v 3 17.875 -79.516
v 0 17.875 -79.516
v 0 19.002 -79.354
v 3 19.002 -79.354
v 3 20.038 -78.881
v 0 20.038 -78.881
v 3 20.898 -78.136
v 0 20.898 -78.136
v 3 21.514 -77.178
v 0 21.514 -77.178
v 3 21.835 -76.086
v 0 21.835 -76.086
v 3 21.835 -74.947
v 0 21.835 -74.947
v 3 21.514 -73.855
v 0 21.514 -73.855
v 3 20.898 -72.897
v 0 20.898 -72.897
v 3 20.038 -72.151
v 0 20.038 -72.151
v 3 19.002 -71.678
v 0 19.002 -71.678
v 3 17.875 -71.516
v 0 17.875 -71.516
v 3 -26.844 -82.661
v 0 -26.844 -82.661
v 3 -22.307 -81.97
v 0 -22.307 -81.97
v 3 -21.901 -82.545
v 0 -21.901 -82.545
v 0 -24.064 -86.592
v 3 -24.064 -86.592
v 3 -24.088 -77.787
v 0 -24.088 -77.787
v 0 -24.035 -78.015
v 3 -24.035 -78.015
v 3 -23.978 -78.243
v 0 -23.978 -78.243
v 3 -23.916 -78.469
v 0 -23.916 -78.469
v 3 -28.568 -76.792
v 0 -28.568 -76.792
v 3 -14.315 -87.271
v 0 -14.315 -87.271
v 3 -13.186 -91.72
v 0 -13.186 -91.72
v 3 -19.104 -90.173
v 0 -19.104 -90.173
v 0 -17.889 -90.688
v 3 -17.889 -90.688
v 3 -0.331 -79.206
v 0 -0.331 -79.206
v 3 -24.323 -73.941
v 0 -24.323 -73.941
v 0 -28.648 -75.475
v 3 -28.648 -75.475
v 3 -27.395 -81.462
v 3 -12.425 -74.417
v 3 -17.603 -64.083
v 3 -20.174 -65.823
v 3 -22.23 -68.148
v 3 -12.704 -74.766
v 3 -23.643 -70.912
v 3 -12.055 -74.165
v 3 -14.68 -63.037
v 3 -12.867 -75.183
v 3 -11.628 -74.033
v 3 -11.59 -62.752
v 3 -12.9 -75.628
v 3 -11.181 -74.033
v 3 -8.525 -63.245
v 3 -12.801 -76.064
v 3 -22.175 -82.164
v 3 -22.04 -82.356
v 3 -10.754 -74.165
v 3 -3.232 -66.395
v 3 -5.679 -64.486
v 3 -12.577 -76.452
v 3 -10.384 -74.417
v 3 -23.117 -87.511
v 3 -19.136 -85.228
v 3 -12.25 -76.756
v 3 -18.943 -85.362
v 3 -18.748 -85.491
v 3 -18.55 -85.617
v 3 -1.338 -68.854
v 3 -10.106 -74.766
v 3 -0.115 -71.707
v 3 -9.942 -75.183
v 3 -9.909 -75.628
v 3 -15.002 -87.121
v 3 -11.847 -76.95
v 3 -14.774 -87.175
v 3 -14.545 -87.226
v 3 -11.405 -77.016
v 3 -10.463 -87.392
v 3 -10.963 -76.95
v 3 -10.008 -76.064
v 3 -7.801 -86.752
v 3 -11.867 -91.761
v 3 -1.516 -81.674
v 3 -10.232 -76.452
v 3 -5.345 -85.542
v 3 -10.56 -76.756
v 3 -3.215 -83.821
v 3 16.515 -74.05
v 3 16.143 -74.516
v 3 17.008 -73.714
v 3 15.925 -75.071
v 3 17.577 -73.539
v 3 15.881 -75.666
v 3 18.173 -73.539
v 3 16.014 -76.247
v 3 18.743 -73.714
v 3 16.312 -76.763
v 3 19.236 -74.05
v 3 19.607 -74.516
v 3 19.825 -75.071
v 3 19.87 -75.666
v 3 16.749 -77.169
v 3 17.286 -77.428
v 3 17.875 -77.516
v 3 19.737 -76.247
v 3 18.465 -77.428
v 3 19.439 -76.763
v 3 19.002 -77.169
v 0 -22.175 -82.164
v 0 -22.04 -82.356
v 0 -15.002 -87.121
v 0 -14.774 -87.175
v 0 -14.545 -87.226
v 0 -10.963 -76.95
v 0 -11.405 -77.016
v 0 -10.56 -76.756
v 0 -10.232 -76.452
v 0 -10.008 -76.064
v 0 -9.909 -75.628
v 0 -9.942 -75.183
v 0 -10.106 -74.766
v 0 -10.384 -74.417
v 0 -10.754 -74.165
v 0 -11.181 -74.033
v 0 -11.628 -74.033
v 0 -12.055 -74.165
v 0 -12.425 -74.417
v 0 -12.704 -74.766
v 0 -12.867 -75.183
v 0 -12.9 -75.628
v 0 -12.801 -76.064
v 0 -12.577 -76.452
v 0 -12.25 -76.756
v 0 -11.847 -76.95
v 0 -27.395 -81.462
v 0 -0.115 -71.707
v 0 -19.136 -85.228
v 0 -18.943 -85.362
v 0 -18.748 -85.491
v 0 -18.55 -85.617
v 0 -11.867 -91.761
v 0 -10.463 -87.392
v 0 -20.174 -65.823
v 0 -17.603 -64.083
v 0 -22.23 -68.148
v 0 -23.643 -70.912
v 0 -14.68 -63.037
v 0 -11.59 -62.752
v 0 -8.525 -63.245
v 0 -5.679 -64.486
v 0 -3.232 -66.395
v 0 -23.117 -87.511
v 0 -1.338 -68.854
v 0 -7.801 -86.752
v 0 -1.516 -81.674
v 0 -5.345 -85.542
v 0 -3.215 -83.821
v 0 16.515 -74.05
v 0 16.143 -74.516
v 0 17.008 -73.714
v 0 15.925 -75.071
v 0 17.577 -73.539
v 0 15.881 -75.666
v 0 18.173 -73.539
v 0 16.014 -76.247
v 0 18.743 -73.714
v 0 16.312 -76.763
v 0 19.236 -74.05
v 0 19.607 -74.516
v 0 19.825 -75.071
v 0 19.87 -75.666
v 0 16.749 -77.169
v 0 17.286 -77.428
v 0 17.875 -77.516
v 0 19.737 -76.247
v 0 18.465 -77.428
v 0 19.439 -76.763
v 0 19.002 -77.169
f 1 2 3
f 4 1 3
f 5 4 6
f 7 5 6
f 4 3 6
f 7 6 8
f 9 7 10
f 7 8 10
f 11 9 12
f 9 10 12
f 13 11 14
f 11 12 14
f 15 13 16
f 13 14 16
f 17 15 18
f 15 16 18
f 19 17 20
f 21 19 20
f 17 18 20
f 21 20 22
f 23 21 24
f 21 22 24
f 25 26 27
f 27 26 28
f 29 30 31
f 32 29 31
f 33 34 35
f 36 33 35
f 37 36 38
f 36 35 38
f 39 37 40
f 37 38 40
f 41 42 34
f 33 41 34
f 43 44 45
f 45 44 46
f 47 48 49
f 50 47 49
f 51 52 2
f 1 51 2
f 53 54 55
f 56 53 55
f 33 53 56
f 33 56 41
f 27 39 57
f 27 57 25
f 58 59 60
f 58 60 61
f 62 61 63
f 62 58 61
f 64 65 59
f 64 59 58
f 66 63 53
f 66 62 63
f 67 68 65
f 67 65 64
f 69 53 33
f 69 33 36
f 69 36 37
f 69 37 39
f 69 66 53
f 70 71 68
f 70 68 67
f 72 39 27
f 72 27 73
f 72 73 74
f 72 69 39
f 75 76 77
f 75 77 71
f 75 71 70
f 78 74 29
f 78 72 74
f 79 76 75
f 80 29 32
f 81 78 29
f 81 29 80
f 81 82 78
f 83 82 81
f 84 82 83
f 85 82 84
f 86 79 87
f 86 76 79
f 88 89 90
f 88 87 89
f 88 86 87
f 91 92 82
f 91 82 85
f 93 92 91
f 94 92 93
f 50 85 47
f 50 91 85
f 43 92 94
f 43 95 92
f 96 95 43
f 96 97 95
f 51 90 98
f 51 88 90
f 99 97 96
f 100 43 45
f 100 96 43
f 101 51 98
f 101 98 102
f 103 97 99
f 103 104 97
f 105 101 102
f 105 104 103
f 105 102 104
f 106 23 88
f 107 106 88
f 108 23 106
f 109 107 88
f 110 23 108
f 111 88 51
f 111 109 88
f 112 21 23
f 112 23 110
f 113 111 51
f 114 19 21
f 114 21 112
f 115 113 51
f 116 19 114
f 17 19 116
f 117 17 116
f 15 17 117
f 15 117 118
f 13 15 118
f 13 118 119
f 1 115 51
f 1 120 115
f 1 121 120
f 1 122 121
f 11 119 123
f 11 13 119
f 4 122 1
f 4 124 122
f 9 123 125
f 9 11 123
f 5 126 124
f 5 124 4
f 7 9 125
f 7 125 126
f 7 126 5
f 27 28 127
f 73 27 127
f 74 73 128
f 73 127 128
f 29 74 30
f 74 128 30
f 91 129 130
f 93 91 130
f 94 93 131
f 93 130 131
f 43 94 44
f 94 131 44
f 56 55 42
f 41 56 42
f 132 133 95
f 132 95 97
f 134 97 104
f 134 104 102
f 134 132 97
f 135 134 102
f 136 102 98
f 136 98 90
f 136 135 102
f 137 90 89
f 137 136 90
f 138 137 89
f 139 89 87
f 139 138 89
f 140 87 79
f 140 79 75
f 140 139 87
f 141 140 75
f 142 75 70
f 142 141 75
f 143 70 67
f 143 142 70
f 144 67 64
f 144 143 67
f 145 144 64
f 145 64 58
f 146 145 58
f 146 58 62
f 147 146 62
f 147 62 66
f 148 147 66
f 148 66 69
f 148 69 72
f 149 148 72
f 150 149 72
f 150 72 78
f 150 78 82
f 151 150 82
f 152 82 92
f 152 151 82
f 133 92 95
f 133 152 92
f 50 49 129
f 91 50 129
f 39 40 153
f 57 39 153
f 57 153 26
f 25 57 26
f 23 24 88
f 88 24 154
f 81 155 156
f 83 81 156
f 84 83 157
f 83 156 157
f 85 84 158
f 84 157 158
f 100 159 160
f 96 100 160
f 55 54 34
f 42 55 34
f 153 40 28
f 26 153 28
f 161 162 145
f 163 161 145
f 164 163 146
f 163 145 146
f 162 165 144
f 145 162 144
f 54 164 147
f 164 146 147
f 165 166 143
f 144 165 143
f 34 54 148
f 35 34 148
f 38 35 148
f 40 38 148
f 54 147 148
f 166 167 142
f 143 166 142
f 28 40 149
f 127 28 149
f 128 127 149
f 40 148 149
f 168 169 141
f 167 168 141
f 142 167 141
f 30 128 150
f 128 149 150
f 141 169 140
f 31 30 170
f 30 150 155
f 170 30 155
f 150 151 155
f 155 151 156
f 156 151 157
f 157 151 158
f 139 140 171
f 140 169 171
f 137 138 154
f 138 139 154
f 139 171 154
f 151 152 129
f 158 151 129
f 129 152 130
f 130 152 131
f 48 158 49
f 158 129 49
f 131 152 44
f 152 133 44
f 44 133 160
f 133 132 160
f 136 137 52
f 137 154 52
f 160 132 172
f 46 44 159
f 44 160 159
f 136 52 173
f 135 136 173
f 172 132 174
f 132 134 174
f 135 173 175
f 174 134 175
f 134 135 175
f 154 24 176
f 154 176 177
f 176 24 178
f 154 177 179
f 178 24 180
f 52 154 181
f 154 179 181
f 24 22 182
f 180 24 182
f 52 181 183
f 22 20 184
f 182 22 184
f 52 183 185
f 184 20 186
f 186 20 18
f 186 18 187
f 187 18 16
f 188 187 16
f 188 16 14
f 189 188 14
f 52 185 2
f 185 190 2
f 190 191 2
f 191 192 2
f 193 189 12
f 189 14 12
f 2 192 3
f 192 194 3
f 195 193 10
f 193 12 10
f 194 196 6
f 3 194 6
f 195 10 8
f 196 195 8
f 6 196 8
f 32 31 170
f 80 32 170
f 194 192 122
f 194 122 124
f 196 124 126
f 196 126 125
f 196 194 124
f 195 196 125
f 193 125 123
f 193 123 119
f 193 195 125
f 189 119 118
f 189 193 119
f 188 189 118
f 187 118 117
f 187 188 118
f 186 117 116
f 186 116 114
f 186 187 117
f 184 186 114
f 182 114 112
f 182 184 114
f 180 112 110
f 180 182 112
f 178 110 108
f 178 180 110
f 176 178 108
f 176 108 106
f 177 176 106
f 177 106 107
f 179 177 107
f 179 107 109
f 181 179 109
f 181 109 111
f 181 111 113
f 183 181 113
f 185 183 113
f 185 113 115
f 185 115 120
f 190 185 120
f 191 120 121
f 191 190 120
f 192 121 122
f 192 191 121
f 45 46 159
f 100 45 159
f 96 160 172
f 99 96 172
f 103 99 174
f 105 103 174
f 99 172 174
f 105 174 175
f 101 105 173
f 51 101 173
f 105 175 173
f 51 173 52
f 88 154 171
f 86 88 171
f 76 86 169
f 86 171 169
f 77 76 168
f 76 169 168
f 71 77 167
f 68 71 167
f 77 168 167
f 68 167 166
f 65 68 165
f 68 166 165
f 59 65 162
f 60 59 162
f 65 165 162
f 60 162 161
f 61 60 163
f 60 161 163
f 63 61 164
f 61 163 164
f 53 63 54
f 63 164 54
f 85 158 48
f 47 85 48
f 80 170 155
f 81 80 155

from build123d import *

# Parameters (mm, degrees)
SKETCH_1_R      = 2
SKETCH_1_R_2    = 1.5
EXTRUDE_2_DEPTH = 3


with BuildPart() as part:
    # ｽｹｯﾁ1 → ﾎﾞｽ - 押し出し2 (new body)
    with BuildSketch(Plane(origin=(0, 0, 0), x_dir=(0, 0, -1), z_dir=(1, 0, 0))):
        with BuildLine():
            ThreePointArc((79.516381724, 17.875328128), (75.516381724, 21.875328128), (71.516381724, 17.875328128))
            Line((71.516381724, 17.875328128), (71.707016231, -0.114604955))
            ThreePointArc((71.707016231, -0.114604955), (62.797189361, -13.143986116), (73.940663181, -24.323108598))
            Line((73.940663181, -24.323108598), (75.474683518, -28.648291112))
            Line((75.474683518, -28.648291112), (76.792060343, -28.56761025))
            Line((76.792060343, -28.56761025), (77.786816557, -24.087556428))
            ThreePointArc((77.786816557, -24.087556428), (78.129155766, -24.006767492), (78.469059941, -23.916279163))
            Line((78.469059941, -23.916279163), (81.461927443, -27.395239681))
            Line((81.461927443, -27.395239681), (82.661199459, -26.844115619))
            Line((82.661199459, -26.844115619), (81.970399896, -22.307242452))
            ThreePointArc((81.970399896, -22.307242452), (82.260437372, -22.108241826), (82.544700421, -21.901076422))
            Line((82.544700421, -21.901076422), (86.592211747, -24.063962049))
            Line((86.592211747, -24.063962049), (87.511410622, -23.116827145))
            Line((87.511410622, -23.116827145), (85.228351592, -19.135864493))
            ThreePointArc((85.228351592, -19.135864493), (85.426916166, -18.845528315), (85.61714679, -18.549664671))
            Line((85.61714679, -18.549664671), (90.172663107, -19.104365719))
            Line((90.172663107, -19.104365719), (90.687645941, -17.889135789))
            Line((90.687645941, -17.889135789), (87.120667215, -15.001734719))
            ThreePointArc((87.120667215, -15.001734719), (87.200941642, -14.659274498), (87.27144814, -14.314670639))
            Line((87.27144814, -14.314670639), (91.719721727, -13.186271657))
            Line((91.719721727, -13.186271657), (91.760937233, -11.867070238))
            Line((91.760937233, -11.867070238), (87.391779056, -10.463190263))
            ThreePointArc((87.391779056, -10.463190263), (84.740310623, -4.232469554), (79.205934948, -0.330822302))
            Line((79.205934948, -0.330822302), (79.516381724, 17.875328128))
        make_face()
        with Locations((75.516381724, 17.875328128)):
            Circle(SKETCH_1_R, mode=Mode.SUBTRACT)
        with Locations((75.516381724, -11.404671872)):
            Circle(SKETCH_1_R_2, mode=Mode.SUBTRACT)
    extrude(amount=EXTRUDE_2_DEPTH)


solid = part.part
